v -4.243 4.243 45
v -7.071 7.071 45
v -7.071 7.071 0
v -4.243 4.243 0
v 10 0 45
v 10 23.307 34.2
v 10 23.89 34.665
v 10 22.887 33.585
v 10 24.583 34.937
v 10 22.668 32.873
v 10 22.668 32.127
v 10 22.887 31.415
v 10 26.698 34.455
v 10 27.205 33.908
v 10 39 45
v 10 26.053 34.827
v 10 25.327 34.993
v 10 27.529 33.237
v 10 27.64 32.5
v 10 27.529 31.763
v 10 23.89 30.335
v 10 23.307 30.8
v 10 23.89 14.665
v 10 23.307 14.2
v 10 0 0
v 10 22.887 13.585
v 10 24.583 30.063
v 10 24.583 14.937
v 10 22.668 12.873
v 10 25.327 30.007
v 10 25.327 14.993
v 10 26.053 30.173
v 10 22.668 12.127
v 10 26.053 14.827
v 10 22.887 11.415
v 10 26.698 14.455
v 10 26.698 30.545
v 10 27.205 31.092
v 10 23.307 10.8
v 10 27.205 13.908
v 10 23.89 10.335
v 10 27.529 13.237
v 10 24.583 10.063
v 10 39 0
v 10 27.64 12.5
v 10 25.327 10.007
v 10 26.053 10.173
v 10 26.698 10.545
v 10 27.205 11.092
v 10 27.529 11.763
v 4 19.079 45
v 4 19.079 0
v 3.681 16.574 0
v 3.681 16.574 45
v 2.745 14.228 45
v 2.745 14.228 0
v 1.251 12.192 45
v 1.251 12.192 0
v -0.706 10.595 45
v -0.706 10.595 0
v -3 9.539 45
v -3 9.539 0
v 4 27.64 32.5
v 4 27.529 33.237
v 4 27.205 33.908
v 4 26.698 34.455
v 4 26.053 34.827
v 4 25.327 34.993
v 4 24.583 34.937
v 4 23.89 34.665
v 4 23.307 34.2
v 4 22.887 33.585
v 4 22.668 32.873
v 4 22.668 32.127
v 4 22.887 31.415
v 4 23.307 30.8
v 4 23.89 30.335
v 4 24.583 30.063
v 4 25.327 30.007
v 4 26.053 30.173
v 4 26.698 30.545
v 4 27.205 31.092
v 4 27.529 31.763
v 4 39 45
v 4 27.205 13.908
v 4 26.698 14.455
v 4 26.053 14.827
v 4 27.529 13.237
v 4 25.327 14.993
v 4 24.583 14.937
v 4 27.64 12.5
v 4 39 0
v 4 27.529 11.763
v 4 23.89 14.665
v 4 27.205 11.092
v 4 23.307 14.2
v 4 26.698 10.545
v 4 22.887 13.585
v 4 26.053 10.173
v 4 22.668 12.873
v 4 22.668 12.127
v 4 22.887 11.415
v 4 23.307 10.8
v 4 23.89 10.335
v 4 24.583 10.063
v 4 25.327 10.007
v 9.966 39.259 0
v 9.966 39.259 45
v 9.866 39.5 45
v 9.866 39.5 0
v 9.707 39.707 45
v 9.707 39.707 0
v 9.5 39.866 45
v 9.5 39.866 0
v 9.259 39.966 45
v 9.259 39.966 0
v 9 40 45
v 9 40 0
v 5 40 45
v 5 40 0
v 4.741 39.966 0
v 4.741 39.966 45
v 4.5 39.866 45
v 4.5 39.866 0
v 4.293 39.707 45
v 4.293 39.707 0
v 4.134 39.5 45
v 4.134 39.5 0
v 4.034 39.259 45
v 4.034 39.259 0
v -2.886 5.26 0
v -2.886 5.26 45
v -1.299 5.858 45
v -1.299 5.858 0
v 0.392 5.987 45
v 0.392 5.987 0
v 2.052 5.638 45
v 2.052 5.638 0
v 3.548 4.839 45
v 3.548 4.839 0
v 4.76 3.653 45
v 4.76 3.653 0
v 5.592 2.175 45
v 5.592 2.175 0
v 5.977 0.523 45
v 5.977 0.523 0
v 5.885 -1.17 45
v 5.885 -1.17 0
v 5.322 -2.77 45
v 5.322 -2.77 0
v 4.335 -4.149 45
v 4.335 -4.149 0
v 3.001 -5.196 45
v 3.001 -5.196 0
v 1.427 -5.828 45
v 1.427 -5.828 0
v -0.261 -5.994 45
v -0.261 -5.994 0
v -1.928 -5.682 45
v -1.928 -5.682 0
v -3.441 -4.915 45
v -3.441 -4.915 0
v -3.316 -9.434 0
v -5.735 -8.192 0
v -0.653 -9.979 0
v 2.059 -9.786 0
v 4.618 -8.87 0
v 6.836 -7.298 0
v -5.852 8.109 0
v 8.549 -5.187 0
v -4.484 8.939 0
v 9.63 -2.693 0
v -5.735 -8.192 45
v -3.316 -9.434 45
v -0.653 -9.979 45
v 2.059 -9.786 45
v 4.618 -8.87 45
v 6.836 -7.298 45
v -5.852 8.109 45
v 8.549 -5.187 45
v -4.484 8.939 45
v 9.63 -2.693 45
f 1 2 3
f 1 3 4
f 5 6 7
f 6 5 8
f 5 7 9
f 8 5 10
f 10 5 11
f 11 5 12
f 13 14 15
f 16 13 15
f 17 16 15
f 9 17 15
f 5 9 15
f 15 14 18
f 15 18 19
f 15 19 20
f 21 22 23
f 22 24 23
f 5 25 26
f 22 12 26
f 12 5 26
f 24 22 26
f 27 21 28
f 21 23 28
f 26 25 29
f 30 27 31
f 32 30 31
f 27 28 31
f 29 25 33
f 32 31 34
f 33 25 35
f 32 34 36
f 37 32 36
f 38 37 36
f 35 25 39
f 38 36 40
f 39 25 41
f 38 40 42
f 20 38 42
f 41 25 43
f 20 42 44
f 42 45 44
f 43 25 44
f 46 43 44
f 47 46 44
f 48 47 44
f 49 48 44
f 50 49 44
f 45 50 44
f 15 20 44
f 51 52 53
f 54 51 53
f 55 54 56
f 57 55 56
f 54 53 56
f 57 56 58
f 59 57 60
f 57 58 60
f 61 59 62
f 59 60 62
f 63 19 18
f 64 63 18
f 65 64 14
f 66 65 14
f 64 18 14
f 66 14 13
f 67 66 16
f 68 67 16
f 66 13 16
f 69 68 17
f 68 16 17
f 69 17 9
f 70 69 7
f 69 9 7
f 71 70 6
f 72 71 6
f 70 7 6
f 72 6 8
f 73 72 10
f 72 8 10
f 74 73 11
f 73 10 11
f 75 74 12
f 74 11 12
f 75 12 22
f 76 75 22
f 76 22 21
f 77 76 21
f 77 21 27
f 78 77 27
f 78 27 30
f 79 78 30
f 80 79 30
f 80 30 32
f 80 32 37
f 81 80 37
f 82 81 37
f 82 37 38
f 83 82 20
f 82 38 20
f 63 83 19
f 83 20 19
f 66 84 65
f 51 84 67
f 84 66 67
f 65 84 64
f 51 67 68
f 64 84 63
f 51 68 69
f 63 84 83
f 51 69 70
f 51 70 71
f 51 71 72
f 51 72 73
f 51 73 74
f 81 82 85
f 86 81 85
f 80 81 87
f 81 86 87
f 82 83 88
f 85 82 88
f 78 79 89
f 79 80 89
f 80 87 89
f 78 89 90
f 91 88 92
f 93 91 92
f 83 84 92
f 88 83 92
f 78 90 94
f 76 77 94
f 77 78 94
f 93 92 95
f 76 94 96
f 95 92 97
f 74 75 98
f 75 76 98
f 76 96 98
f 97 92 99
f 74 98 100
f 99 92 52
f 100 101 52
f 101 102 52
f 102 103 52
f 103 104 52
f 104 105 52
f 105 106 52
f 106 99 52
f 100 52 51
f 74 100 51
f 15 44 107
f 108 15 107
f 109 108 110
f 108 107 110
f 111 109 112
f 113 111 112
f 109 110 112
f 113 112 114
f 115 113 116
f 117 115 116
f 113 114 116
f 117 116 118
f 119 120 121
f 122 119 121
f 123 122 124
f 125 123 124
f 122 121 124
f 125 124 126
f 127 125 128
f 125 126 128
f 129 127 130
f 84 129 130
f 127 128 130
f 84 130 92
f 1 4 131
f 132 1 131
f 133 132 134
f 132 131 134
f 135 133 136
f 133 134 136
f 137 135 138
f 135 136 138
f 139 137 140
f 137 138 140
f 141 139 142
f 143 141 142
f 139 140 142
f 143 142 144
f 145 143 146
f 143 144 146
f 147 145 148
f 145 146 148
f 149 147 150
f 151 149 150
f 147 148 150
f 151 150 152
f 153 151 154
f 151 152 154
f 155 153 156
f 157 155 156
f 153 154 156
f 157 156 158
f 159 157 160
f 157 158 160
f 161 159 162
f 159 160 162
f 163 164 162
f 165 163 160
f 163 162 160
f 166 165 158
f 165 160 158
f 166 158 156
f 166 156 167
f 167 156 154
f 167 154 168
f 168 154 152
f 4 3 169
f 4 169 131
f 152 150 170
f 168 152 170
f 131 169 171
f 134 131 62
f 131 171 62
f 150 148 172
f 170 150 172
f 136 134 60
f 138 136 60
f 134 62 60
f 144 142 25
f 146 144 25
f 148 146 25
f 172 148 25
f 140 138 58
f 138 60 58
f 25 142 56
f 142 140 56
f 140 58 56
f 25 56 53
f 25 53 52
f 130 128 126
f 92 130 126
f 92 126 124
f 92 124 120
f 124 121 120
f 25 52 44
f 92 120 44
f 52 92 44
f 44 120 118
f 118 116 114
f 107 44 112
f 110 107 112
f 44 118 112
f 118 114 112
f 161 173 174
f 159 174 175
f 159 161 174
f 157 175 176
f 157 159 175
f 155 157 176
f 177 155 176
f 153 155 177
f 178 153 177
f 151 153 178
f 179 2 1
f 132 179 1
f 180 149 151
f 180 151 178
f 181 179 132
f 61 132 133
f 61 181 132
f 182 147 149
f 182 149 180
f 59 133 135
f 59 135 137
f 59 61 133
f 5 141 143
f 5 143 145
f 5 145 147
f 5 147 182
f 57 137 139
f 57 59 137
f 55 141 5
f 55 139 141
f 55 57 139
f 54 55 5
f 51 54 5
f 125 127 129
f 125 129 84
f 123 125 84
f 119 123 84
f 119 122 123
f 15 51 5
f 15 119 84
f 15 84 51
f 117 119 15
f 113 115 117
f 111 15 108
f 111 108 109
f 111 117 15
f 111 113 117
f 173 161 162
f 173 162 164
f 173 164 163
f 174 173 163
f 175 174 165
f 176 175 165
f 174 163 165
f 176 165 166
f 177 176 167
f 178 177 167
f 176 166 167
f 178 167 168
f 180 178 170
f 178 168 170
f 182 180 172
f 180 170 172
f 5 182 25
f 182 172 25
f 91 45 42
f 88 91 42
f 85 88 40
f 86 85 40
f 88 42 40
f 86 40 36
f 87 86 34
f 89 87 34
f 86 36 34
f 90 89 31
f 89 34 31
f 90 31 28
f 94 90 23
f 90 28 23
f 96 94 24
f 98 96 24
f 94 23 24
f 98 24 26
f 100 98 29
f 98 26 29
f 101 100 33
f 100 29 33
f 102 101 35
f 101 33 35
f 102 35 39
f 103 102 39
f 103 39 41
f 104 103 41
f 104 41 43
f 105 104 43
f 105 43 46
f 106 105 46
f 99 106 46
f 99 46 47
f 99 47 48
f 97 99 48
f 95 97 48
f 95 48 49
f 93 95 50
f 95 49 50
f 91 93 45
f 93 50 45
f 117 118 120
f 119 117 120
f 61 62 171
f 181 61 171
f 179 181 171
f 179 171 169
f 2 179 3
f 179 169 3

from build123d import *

# Parameters (mm, degrees)
F1_DEPTH = 45
F3_R     = 2.5
F4_DEPTH = 6


with BuildPart() as f1:
    # F0 (on Top) → F1 (new body)
    with BuildSketch(Plane.XY):
        with BuildLine():
            ThreePointArc((-4.242641, 4.242641), (5.977132, 0.523351), (-3.440774, -4.915392))
            Line((-3.440774, -4.915392), (-5.734623, -8.192319))
            ThreePointArc((-5.734623, -8.192319), (4.618104, -8.869787), (10, 0))
            Line((10, 0), (10, 39))
            ThreePointArc((10, 39), (9.707107, 39.707107), (9, 40))
            Line((9, 40), (5, 40))
            ThreePointArc((5, 40), (4.292893, 39.707107), (4, 39))
            Line((4, 39), (4, 19.078784))
            ThreePointArc((4, 19.078784), (2.062258, 13.162704), (-3, 9.539392))
            ThreePointArc((-3, 9.539392), (-5.184569, 8.551037), (-7.071068, 7.071068))
            Line((-7.071068, 7.071068), (-4.242641, 4.242641))
        make_face()
    extrude(amount=F1_DEPTH)

    # F3 (on face) → F4 (cut)
    with BuildSketch(Plane.YZ.offset(10)):
        with Locations((25.139775, 32.5)):
            Circle(F3_R)
        with Locations((25.139775, 12.5)):
            Circle(F3_R)
    extrude(amount=-F4_DEPTH, mode=Mode.SUBTRACT)


solid = f1.part
